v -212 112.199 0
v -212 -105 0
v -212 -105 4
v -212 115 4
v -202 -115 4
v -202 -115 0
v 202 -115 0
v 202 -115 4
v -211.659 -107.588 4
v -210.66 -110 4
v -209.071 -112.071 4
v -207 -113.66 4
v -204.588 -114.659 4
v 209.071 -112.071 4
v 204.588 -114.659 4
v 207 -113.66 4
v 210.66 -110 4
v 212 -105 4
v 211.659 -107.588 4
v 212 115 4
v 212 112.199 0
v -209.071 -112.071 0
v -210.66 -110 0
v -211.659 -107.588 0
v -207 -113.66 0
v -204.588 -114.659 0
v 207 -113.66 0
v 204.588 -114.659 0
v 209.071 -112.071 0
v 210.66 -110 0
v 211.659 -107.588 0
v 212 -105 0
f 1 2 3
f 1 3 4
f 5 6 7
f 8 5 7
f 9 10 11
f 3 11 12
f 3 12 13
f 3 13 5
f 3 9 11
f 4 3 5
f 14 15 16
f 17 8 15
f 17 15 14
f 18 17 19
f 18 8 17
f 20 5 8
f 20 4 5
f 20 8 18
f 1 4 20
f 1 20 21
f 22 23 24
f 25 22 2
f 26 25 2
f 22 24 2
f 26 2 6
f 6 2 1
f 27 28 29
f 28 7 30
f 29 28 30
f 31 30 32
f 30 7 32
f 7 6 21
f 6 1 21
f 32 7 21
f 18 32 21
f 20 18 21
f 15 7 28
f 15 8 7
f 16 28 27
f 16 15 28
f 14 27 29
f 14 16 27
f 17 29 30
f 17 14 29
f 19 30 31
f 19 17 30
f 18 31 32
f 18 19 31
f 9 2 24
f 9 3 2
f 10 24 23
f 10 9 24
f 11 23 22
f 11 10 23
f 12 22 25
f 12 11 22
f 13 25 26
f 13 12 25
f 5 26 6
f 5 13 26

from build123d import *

# Parameters (mm, degrees)
SKETCH_1_W          = 424
SKETCH_1_H          = 230
EXTRUDE_1_DEPTH     = 4
FILLET_1_R          = 10
CUT_EXTRUDE_1_DEPTH = 440.337000491


with BuildPart() as part:
    # Эскиз1 → Бобышка-Вытянуть1 (new body)
    with BuildSketch(Plane.XY):
        Rectangle(SKETCH_1_W, SKETCH_1_H)
    extrude(amount=EXTRUDE_1_DEPTH)

    # Скругление1
    fillet_1_edges = [part.edges().sort_by_distance(p)[0] for p in [
        (212, -115, 2),
        (-212, -115, 2),
    ]]
    fillet(fillet_1_edges, radius=FILLET_1_R)

    # Эскиз2 → Вырез-Вытянуть1 (cut, through all)
    with BuildSketch(Plane(origin=(212, 0, 0), x_dir=(0, 0, -1), z_dir=(1, 0, 0))):
        Polygon((-4, 115), (0, 112.199169847), (0, 115), align=None)
    extrude(amount=-CUT_EXTRUDE_1_DEPTH, mode=Mode.SUBTRACT)


solid = part.part
